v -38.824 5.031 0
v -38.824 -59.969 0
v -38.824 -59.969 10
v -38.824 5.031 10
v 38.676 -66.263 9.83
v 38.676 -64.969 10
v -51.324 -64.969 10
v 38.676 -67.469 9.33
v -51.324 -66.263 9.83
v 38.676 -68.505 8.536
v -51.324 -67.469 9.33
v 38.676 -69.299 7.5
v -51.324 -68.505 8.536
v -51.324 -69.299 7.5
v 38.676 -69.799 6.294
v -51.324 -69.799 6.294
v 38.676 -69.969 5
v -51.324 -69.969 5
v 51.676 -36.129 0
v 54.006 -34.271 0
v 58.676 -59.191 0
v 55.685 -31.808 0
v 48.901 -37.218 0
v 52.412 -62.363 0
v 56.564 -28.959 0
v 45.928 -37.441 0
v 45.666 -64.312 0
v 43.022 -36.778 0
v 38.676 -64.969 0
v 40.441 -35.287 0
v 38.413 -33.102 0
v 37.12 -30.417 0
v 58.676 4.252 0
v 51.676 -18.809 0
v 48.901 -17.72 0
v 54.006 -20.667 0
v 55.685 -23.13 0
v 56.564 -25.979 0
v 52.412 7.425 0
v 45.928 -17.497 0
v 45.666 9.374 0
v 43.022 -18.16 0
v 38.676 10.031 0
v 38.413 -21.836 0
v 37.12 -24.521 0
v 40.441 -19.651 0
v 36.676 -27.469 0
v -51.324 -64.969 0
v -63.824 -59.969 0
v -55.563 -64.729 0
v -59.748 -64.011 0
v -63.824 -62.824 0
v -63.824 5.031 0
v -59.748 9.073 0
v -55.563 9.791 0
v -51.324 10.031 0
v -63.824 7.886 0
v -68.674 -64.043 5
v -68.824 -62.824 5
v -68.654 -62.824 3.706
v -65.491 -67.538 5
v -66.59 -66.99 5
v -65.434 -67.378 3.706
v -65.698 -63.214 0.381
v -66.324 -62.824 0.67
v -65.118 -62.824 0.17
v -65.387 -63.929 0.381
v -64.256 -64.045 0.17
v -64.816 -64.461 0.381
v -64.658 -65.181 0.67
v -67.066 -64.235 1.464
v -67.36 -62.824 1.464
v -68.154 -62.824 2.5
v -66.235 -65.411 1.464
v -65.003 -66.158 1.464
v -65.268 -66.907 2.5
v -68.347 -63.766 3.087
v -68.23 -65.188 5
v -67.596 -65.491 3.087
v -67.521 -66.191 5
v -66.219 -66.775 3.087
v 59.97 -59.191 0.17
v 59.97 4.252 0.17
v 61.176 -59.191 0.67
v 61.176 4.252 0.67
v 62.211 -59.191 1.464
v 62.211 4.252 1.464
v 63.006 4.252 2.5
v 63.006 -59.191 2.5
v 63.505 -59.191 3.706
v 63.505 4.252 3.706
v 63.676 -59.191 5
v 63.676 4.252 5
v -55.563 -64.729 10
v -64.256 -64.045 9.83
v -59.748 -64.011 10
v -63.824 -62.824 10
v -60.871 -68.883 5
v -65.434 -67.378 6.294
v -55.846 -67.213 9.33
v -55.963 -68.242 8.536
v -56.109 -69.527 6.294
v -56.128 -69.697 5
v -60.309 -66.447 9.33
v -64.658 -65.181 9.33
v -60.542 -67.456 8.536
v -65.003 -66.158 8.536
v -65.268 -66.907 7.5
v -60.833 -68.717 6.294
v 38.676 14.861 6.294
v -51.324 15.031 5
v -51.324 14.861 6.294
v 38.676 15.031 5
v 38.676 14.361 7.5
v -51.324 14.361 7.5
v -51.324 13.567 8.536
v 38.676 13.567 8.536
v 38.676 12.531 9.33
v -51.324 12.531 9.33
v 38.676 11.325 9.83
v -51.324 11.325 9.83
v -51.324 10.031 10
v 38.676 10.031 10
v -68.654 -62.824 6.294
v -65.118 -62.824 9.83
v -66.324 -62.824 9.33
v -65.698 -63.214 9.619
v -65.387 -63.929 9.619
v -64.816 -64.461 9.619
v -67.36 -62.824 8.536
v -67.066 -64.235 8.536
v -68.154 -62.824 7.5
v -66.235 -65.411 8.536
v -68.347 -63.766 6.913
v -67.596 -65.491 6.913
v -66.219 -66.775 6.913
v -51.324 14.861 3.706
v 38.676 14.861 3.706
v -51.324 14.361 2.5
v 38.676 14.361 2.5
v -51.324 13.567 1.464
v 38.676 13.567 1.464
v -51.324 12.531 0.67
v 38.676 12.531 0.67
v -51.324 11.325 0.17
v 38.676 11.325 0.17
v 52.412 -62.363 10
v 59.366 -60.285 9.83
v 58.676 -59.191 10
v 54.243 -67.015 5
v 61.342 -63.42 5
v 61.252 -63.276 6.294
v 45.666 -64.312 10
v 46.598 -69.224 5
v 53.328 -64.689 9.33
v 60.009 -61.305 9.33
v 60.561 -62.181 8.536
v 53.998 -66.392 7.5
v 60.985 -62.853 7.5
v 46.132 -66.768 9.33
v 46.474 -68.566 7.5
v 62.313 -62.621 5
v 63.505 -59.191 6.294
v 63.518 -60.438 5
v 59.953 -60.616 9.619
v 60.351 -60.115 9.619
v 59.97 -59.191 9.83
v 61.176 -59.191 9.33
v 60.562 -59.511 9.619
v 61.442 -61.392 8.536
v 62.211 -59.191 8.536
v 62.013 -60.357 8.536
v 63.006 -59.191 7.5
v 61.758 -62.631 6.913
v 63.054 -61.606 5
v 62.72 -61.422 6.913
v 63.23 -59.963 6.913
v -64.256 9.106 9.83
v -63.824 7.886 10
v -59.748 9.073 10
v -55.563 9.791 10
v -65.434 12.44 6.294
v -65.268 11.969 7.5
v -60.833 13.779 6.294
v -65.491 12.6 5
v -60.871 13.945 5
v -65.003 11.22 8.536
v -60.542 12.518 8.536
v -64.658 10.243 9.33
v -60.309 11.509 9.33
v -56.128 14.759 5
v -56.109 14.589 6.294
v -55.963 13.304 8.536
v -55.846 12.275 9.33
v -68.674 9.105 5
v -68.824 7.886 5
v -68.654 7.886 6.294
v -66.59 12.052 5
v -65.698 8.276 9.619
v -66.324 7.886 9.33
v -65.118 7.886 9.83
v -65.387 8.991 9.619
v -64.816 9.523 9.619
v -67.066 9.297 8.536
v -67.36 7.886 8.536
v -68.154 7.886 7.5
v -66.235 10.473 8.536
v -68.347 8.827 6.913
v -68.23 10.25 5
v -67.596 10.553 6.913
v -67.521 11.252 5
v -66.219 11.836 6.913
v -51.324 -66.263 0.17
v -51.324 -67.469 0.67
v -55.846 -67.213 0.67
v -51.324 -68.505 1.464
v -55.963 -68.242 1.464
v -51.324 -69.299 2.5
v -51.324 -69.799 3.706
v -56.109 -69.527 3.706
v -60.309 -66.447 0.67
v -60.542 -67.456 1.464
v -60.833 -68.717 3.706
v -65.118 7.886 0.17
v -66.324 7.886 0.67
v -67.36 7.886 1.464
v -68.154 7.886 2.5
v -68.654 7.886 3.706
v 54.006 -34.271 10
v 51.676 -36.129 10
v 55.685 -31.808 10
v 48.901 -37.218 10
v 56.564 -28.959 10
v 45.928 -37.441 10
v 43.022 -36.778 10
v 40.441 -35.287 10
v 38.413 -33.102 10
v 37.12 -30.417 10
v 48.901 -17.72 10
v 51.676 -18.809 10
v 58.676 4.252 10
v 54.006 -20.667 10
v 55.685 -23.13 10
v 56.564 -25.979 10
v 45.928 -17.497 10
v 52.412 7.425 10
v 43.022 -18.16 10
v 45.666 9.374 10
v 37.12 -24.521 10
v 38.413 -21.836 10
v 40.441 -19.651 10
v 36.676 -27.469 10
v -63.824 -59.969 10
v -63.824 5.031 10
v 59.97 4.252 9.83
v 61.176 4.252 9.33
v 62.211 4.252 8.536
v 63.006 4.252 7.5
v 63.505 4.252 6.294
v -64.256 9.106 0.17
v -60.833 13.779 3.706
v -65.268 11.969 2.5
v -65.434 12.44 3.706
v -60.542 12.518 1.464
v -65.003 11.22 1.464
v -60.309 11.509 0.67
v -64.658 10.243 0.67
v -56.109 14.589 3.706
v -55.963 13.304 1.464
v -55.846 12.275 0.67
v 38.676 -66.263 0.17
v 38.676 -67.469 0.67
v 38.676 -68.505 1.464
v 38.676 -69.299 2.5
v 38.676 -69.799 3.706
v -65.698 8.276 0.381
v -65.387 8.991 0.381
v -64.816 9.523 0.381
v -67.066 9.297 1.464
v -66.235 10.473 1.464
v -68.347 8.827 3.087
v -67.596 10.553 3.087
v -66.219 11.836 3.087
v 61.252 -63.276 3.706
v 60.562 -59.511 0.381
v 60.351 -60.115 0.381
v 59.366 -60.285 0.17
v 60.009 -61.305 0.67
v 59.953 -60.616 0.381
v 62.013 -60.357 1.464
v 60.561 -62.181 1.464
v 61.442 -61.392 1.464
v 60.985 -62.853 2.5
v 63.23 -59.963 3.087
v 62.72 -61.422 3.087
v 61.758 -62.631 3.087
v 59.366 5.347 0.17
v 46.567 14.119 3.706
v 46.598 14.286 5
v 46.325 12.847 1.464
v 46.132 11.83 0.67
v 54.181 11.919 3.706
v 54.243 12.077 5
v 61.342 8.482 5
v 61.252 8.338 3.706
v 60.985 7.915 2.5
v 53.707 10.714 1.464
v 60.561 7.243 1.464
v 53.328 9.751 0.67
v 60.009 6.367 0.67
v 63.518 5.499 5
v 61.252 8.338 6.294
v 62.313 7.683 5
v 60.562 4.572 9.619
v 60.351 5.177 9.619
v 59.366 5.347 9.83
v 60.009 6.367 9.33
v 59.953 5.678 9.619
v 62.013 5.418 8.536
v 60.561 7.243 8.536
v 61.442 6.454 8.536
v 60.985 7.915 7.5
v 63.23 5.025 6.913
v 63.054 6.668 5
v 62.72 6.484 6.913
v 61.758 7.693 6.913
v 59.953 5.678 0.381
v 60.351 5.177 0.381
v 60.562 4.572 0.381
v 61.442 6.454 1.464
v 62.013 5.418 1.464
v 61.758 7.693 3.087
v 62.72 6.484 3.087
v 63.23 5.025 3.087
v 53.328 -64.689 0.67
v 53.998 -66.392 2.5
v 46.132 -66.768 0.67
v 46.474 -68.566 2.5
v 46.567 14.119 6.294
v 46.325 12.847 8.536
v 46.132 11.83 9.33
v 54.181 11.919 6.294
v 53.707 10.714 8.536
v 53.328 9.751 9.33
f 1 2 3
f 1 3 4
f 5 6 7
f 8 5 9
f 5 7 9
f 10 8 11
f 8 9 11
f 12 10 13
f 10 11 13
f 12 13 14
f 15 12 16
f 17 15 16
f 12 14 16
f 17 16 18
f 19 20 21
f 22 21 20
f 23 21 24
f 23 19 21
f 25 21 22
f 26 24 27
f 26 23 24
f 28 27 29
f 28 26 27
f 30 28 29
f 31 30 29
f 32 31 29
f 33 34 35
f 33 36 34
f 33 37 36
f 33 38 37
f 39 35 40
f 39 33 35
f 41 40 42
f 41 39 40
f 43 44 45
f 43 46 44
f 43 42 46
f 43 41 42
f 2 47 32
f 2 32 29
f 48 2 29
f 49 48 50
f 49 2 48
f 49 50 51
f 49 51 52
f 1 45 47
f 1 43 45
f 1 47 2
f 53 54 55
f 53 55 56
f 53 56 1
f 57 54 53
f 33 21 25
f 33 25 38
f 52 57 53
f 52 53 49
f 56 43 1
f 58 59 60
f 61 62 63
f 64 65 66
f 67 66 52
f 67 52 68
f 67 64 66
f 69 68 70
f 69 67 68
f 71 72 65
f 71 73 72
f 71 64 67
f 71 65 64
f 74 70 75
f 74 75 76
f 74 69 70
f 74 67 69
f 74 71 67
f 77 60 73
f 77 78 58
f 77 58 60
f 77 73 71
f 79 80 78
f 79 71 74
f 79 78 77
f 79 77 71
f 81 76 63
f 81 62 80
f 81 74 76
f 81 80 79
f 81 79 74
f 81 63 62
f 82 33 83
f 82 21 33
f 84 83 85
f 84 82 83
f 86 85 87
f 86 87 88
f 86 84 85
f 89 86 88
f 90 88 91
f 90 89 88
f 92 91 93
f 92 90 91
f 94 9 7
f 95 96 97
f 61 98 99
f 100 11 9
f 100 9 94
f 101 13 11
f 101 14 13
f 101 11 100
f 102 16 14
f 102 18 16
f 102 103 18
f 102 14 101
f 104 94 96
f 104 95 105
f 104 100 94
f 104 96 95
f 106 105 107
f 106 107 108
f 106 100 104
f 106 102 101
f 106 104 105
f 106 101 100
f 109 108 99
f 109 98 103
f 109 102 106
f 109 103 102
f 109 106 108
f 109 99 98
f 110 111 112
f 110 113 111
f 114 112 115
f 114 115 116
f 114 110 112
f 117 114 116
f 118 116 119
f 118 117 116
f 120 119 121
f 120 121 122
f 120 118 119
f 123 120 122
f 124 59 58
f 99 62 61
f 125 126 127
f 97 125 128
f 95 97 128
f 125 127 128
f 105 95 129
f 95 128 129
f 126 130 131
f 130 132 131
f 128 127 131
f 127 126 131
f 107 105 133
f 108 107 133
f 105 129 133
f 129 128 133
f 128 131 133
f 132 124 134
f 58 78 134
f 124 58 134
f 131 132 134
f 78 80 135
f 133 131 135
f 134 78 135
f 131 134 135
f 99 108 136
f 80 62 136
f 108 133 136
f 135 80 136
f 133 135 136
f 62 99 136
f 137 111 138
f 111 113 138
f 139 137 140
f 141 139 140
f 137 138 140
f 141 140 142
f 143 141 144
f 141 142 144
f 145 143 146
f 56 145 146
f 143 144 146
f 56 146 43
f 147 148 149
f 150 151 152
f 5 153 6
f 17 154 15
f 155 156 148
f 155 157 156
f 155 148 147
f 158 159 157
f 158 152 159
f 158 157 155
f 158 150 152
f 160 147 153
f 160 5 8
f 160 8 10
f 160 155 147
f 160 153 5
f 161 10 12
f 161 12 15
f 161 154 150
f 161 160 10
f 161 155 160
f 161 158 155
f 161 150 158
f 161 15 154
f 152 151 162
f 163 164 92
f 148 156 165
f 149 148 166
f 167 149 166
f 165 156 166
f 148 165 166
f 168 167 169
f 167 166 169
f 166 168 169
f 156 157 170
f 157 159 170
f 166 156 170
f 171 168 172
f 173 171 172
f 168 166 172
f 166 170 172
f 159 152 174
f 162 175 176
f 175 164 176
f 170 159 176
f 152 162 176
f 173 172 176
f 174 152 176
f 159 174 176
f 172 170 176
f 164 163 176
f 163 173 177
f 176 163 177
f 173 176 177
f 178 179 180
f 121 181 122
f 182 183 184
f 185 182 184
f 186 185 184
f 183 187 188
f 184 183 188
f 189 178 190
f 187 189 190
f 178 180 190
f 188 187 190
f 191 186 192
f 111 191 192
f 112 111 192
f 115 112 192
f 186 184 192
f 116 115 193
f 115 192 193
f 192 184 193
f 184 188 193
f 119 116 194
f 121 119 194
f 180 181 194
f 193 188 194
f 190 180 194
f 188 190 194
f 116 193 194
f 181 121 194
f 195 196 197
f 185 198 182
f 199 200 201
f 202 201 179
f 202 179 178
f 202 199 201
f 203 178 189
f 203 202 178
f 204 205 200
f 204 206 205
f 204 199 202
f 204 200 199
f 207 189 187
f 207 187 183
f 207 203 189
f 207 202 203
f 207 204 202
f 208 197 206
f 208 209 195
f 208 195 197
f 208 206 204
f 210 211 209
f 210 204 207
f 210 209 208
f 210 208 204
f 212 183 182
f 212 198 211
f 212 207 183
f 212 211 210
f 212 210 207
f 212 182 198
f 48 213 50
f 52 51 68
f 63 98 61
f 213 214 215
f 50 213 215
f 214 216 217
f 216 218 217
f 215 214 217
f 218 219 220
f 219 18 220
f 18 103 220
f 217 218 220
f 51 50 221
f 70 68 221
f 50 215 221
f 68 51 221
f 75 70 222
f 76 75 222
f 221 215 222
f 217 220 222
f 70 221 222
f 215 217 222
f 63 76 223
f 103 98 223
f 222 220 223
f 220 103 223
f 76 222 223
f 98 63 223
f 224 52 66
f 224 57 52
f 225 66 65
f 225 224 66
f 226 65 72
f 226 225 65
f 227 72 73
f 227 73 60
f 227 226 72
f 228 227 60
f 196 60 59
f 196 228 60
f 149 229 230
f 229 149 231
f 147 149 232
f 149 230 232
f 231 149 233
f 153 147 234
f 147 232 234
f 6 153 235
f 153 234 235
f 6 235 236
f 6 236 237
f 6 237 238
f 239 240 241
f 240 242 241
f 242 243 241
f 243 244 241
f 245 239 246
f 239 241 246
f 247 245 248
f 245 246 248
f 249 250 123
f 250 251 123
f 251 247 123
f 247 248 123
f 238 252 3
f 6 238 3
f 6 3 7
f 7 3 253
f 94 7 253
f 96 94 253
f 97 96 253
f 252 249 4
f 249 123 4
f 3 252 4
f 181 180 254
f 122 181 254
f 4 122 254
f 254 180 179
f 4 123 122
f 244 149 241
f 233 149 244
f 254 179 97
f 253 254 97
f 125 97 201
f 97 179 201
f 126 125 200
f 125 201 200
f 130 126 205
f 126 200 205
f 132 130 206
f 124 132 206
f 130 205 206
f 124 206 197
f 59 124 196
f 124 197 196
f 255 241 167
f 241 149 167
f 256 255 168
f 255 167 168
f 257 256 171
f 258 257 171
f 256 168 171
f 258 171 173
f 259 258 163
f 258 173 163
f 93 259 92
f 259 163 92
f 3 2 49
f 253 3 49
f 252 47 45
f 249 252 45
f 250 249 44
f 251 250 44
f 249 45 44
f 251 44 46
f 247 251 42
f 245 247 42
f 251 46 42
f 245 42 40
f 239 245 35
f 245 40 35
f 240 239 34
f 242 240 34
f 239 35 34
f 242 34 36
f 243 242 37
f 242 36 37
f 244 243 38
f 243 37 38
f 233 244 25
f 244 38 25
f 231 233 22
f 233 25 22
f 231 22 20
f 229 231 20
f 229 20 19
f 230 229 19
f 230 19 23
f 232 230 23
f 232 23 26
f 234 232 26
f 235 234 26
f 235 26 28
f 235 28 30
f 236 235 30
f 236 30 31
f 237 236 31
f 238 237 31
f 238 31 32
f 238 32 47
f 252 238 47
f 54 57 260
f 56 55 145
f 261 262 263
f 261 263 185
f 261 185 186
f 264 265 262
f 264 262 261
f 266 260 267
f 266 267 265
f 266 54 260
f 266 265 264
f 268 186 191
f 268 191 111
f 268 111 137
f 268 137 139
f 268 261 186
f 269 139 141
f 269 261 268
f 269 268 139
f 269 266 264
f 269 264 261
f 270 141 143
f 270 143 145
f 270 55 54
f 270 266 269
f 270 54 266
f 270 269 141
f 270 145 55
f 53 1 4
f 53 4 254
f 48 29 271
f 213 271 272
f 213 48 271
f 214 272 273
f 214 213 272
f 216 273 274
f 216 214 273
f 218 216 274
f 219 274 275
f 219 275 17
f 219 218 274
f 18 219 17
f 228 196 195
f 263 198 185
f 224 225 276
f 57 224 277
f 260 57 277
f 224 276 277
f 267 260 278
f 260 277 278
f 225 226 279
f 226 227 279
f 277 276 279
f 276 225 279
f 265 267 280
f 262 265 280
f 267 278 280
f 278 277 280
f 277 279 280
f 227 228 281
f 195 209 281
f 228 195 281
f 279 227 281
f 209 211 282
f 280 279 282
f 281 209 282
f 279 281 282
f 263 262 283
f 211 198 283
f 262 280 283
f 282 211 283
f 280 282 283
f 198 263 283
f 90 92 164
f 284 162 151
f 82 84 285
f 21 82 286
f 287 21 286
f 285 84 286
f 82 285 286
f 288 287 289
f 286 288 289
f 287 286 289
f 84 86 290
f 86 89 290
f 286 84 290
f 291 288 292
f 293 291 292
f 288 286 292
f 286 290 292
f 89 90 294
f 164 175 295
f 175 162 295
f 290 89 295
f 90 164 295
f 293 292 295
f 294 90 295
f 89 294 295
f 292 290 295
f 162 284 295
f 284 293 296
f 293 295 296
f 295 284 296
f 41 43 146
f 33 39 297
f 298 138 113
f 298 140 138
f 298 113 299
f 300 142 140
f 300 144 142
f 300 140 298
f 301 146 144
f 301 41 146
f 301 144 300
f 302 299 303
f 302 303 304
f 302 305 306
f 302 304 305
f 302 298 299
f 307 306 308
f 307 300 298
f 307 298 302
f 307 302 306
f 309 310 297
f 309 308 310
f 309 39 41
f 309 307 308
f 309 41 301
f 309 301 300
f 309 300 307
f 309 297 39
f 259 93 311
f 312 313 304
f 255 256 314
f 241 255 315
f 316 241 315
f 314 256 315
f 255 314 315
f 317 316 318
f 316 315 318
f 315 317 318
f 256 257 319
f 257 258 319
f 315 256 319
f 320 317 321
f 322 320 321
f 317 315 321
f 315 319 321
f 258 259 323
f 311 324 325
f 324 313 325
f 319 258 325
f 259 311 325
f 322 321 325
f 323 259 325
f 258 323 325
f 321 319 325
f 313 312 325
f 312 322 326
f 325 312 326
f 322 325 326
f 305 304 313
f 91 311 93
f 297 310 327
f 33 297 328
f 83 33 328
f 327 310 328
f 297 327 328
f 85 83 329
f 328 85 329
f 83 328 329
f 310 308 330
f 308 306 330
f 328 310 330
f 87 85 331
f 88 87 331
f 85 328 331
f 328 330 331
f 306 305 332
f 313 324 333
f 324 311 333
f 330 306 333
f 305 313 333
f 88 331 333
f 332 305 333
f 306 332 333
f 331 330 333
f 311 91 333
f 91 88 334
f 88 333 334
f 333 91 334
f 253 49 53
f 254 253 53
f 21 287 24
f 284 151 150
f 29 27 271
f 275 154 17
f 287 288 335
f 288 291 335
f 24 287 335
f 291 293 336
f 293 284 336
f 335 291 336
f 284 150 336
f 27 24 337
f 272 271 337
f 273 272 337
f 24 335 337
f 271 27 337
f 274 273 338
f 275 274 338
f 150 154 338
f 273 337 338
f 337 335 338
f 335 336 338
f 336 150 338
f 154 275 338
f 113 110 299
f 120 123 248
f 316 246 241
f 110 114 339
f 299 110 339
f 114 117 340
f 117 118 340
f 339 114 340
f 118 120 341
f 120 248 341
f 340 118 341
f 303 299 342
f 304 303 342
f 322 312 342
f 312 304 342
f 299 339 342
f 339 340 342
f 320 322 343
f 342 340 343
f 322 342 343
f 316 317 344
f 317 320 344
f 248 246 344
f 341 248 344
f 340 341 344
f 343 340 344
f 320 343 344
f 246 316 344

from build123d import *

# Parameters (mm, degrees)
BOSS_EXTRUDE1_DEPTH = 10
SKETCH2_W           = 25
SKETCH2_H           = 65
CUT_EXTRUDE2_DEPTH  = 20
SKETCH3_R           = 10
CUT_EXTRUDE3_DEPTH  = 20
FILLET2_R           = 5


with BuildPart() as part:
    # Sketch1 → Boss-Extrude1 (new body)
    with BuildSketch(Plane.XY):
        with BuildLine():
            Line((-51.324273213, 15.030948404), (38.675726787, 15.030948404))
            ThreePointArc((38.675726787, 15.030948404), (51.820193251, 12.947195155), (63.675726787, 6.900266117))
            Line((63.675726787, 6.900266117), (63.675726787, -61.838369308))
            ThreePointArc((63.675726787, -61.838369308), (51.820193251, -67.885298346), (38.675726787, -69.969051596))
            Line((38.675726787, -69.969051596), (-51.324273213, -69.969051596))
            ThreePointArc((-51.324273213, -69.969051596), (-60.275029546, -69.015819954), (-68.824273213, -66.198885058))
            Line((-68.824273213, -66.198885058), (-68.824273213, 11.260781867))
            ThreePointArc((-68.824273213, 11.260781867), (-60.275029546, 14.077716763), (-51.324273213, 15.030948404))
        make_face()
    extrude(amount=BOSS_EXTRUDE1_DEPTH)

    # Sketch2 → Cut-Extrude2 (cut)
    with BuildSketch(Plane(origin=(0, 0, 0), x_dir=(-1, 0, 0), z_dir=(0, 0, -1))):
        with Locations((51.324273213, -27.469051596)):
            Rectangle(SKETCH2_W, SKETCH2_H)
    extrude(amount=-CUT_EXTRUDE2_DEPTH, mode=Mode.SUBTRACT)

    # Sketch3 → Cut-Extrude3 (cut)
    with BuildSketch(Plane(origin=(0, 0, 0), x_dir=(-1, 0, 0), z_dir=(0, 0, -1))):
        with Locations((-46.675726787, -27.469051596)):
            Circle(SKETCH3_R)
    extrude(amount=-CUT_EXTRUDE3_DEPTH, mode=Mode.SUBTRACT)

    # Fillet2
    fillet2_edges = [part.edges().sort_by_distance(p)[0] for p in [
        (51.820193251, 12.947195155, 10),
        (63.675726787, -27.469051596, 0),
        (51.820193251, -67.885298346, 0),
        (-6.324273213, 15.030948404, 10),
        (38.675726787, -69.969051596, 5),
        (-51.324273213, -69.969051596, 5),
        (-68.824273213, -66.198885058, 5),
        (-68.824273213, 11.260781867, 5),
        (-51.324273213, 15.030948404, 5),
        (38.675726787, 15.030948404, 5),
        (63.675726787, 6.900266117, 5),
        (63.675726787, -61.838369308, 5),
        (-60.275029546, 14.077716763, 10),
        (-68.824273213, -27.469051596, 10),
        (-60.275029546, -69.015819954, 10),
        (-6.324273213, -69.969051596, 10),
        (51.820193251, -67.885298346, 10),
        (63.675726787, -27.469051596, 10),
        (-6.324273213, -69.969051596, 0),
        (-60.275029546, -69.015819954, 0),
        (-68.824273213, -27.469051596, 0),
        (-60.275029546, 14.077716763, 0),
        (-6.324273213, 15.030948404, 0),
        (51.820193251, 12.947195155, 0),
    ]]
    fillet(fillet2_edges, radius=FILLET2_R - 0.0001)  # a hair under: the kernel refuses the full size


solid = part.part
